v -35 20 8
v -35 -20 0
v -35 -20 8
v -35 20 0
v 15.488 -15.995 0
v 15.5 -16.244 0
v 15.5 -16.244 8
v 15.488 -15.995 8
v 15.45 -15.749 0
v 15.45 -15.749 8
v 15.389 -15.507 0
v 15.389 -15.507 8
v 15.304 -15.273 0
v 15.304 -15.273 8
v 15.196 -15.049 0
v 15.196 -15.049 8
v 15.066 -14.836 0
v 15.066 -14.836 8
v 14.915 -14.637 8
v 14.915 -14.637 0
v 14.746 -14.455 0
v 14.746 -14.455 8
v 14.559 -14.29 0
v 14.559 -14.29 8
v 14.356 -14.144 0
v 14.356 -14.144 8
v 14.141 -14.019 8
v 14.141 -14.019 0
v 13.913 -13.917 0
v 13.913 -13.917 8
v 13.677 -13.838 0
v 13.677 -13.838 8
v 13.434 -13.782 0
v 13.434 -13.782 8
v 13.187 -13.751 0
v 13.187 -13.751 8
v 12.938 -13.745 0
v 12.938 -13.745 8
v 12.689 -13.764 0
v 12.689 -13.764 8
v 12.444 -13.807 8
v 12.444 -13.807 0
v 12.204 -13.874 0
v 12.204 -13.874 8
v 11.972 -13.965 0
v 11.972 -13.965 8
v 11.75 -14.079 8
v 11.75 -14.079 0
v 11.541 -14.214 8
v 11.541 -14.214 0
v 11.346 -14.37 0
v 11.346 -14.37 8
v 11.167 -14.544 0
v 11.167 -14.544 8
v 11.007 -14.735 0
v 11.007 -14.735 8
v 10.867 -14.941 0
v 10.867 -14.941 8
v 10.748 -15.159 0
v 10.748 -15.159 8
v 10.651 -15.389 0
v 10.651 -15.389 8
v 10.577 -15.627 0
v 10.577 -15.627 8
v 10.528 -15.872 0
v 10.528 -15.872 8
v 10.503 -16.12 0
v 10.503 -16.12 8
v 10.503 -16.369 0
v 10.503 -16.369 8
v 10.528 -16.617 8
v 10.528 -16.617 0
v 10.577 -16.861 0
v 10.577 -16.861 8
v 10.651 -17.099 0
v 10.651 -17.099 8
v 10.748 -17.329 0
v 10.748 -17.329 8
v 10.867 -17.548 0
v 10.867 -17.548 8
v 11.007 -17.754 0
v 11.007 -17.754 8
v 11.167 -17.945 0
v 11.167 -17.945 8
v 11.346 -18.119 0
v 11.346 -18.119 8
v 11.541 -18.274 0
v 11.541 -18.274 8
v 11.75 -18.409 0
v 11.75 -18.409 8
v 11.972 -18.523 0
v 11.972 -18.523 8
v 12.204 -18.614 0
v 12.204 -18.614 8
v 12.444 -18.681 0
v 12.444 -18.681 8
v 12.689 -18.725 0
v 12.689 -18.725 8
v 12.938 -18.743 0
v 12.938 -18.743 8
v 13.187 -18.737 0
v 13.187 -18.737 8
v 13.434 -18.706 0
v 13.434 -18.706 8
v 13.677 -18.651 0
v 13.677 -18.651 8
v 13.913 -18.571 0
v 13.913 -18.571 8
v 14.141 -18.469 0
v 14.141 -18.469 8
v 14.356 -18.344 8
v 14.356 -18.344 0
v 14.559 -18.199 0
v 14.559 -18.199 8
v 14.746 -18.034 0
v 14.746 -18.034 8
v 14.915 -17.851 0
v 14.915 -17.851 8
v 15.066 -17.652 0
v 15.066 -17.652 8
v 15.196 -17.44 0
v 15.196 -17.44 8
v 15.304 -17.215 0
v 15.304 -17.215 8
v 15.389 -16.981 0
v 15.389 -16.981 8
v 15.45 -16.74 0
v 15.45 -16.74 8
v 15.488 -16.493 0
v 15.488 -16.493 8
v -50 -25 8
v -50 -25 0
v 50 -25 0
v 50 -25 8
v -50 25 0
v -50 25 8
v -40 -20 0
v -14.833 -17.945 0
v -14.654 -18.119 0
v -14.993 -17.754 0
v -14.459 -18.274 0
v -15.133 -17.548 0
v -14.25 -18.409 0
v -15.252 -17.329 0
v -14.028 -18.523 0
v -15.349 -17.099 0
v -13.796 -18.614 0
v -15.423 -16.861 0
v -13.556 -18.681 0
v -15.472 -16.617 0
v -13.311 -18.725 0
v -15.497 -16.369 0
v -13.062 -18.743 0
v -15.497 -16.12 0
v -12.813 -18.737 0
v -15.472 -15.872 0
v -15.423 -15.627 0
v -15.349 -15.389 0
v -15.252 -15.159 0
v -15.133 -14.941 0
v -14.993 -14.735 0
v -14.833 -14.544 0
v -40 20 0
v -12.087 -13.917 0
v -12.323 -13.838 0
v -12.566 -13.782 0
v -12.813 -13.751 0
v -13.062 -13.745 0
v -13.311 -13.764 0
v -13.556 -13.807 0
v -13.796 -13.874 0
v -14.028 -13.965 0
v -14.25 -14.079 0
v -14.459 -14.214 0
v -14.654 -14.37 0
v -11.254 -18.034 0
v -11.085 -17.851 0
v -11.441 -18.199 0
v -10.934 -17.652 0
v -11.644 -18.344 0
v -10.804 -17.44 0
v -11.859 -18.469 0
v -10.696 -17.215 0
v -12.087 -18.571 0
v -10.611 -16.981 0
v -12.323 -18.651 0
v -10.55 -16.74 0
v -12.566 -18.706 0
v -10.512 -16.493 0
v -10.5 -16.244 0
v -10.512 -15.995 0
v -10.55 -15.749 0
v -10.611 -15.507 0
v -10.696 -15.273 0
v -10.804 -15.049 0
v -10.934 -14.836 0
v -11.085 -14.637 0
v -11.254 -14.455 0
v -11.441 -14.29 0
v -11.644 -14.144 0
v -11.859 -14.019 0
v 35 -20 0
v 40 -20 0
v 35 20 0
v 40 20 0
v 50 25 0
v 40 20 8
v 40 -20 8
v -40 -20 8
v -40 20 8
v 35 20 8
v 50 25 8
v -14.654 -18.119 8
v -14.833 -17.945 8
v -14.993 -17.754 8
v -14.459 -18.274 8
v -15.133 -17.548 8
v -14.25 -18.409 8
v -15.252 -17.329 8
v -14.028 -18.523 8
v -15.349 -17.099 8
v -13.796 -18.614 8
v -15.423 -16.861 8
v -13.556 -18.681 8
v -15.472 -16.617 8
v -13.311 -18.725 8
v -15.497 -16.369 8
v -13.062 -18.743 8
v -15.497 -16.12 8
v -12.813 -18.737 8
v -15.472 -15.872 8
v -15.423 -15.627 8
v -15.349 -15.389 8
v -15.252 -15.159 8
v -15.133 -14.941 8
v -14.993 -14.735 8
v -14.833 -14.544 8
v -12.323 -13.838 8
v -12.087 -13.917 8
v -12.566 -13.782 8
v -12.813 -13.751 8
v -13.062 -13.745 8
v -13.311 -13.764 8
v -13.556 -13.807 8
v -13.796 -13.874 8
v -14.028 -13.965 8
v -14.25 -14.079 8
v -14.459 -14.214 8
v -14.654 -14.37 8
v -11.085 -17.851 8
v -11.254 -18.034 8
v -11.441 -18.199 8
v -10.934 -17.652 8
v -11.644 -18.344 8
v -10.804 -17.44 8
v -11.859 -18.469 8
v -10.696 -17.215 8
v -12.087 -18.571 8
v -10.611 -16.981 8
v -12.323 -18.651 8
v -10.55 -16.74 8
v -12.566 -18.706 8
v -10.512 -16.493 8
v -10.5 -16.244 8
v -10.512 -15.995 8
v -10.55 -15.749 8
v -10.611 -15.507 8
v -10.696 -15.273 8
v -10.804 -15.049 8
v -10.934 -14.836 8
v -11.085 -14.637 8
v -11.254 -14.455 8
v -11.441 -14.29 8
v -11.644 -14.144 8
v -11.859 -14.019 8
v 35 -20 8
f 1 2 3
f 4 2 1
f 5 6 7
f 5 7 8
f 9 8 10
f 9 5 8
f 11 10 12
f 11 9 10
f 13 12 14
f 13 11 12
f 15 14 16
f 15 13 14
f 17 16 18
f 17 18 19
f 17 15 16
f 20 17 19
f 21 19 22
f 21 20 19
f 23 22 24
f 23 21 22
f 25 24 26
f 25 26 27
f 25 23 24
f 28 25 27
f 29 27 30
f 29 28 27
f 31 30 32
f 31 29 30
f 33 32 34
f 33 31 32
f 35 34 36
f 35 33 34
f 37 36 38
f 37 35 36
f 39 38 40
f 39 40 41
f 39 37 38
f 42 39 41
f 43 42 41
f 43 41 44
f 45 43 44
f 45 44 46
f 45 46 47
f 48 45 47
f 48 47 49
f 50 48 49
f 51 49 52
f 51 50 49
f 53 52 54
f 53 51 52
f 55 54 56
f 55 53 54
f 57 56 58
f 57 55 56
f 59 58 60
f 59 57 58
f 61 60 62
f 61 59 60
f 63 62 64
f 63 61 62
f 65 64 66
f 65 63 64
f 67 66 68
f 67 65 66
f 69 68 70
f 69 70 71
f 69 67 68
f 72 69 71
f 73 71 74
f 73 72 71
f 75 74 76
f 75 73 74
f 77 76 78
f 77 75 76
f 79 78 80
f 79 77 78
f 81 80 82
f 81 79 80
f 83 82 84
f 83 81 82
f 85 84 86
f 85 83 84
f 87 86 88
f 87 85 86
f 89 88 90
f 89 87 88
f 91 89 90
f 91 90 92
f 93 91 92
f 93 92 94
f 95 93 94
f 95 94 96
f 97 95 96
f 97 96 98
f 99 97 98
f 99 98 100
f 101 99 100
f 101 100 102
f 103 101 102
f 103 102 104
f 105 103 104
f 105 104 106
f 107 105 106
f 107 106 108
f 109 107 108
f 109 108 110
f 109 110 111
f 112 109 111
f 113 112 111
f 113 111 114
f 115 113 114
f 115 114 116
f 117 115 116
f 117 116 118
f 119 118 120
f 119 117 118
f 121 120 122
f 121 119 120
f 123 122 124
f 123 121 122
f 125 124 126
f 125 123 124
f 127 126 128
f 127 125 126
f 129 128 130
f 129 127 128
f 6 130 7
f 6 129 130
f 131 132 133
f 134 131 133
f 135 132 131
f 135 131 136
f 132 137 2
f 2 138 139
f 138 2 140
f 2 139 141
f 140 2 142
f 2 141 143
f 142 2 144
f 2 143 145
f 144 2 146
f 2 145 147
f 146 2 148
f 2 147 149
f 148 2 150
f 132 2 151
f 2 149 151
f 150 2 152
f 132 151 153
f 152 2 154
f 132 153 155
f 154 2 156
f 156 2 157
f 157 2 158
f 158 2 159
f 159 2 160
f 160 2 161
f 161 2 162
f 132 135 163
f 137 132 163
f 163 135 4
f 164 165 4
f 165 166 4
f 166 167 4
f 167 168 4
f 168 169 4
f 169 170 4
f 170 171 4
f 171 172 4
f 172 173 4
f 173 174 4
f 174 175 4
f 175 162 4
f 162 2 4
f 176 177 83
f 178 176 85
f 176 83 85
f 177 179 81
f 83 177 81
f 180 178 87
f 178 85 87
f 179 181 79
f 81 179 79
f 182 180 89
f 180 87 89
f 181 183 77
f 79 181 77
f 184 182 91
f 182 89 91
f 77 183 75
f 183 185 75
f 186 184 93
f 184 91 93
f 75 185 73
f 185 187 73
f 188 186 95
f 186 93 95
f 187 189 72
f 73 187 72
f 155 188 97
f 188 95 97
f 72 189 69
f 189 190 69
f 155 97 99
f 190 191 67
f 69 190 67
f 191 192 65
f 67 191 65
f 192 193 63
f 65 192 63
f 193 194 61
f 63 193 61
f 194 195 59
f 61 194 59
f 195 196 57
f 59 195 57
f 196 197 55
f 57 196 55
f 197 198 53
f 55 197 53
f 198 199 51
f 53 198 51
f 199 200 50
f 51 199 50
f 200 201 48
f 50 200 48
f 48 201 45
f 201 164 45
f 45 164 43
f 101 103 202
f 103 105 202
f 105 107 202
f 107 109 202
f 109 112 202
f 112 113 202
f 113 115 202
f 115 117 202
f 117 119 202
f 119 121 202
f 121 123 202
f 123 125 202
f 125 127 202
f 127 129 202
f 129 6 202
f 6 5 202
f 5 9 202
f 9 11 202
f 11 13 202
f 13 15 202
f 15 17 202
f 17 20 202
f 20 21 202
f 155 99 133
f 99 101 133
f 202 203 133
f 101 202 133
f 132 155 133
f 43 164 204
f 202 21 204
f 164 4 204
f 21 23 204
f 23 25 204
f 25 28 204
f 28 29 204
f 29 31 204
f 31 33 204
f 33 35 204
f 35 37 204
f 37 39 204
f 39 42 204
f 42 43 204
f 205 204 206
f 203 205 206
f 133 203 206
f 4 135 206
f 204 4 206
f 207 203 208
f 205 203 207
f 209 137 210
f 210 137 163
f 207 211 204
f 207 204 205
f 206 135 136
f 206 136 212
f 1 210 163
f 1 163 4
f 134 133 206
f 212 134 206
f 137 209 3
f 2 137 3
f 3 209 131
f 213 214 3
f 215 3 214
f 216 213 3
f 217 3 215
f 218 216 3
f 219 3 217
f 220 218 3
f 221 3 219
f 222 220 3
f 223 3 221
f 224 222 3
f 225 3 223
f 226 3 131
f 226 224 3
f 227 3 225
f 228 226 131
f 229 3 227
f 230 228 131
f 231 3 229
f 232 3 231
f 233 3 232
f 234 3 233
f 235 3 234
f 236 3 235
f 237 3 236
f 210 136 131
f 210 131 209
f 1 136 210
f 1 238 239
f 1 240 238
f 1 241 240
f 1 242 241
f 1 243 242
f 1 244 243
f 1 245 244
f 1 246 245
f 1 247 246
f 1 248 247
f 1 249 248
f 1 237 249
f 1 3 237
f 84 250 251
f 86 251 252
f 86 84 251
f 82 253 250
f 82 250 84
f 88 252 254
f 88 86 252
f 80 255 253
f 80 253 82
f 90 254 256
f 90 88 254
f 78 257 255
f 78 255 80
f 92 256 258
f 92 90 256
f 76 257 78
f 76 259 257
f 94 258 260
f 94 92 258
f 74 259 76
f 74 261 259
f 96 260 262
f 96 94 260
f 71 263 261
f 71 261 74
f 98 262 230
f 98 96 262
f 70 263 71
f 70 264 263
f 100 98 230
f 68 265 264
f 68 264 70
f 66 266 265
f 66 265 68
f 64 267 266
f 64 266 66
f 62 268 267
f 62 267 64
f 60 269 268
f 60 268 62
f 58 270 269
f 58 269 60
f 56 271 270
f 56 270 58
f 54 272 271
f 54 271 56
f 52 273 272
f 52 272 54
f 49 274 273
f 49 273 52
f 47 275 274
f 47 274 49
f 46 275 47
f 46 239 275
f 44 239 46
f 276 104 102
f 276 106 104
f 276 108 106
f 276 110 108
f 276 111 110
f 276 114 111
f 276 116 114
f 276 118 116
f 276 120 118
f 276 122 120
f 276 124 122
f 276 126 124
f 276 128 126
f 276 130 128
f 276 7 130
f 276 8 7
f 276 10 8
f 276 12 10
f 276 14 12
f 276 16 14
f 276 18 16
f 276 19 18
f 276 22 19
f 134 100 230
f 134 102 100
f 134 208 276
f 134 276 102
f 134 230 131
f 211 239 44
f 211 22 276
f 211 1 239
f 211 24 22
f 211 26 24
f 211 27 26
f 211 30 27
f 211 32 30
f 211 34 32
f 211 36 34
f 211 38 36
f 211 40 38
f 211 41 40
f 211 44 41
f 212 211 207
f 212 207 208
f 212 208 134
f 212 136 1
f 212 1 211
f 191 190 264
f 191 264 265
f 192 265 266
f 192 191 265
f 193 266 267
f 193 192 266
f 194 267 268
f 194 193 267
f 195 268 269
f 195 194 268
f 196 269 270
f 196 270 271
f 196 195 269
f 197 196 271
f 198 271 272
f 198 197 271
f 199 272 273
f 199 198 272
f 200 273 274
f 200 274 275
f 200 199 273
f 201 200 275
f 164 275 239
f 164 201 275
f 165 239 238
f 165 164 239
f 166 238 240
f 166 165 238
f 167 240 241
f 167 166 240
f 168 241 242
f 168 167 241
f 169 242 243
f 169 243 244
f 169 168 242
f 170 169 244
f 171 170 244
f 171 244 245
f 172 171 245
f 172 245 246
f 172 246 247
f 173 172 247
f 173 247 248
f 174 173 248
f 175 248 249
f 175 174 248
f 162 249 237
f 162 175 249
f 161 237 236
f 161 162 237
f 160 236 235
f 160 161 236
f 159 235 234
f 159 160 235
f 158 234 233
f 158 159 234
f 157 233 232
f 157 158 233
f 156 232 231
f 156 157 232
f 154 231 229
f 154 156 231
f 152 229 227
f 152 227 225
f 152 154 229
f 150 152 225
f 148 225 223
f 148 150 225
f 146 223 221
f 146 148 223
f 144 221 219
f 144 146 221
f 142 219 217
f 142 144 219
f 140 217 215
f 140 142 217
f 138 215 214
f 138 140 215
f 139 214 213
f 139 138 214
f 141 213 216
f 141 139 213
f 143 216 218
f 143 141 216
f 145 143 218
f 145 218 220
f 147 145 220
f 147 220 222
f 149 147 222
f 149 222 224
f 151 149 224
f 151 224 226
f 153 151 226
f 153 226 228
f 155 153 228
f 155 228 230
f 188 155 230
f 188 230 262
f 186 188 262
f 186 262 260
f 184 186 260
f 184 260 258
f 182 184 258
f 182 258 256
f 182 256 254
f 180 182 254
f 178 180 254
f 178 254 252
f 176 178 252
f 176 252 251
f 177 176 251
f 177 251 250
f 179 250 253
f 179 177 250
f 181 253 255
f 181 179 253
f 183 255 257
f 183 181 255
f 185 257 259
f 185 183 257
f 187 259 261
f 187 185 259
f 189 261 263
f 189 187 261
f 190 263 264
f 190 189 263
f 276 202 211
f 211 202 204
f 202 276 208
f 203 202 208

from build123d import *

# Parameters (mm, degrees)
SKETCH1_W           = 100
SKETCH1_H           = 50
SKETCH1_R           = 2.5
SKETCH1_W_2         = 5
SKETCH1_H_2         = 40
BOSS_EXTRUDE1_DEPTH = 8


with BuildPart() as part:
    # Sketch1 → Boss-Extrude1 (new body)
    with BuildSketch(Plane.XY):
        Rectangle(SKETCH1_W, SKETCH1_H)
        with Locations((-13, -16.244168493)):
            Circle(SKETCH1_R, mode=Mode.SUBTRACT)
        with Locations((13, -16.244168493)):
            Circle(SKETCH1_R, mode=Mode.SUBTRACT)
        with Locations((-37.5, 0)):
            Rectangle(SKETCH1_W_2, SKETCH1_H_2, mode=Mode.SUBTRACT)
        with Locations((37.5, 0)):
            Rectangle(SKETCH1_W_2, SKETCH1_H_2, mode=Mode.SUBTRACT)
    extrude(amount=BOSS_EXTRUDE1_DEPTH)


solid = part.part
